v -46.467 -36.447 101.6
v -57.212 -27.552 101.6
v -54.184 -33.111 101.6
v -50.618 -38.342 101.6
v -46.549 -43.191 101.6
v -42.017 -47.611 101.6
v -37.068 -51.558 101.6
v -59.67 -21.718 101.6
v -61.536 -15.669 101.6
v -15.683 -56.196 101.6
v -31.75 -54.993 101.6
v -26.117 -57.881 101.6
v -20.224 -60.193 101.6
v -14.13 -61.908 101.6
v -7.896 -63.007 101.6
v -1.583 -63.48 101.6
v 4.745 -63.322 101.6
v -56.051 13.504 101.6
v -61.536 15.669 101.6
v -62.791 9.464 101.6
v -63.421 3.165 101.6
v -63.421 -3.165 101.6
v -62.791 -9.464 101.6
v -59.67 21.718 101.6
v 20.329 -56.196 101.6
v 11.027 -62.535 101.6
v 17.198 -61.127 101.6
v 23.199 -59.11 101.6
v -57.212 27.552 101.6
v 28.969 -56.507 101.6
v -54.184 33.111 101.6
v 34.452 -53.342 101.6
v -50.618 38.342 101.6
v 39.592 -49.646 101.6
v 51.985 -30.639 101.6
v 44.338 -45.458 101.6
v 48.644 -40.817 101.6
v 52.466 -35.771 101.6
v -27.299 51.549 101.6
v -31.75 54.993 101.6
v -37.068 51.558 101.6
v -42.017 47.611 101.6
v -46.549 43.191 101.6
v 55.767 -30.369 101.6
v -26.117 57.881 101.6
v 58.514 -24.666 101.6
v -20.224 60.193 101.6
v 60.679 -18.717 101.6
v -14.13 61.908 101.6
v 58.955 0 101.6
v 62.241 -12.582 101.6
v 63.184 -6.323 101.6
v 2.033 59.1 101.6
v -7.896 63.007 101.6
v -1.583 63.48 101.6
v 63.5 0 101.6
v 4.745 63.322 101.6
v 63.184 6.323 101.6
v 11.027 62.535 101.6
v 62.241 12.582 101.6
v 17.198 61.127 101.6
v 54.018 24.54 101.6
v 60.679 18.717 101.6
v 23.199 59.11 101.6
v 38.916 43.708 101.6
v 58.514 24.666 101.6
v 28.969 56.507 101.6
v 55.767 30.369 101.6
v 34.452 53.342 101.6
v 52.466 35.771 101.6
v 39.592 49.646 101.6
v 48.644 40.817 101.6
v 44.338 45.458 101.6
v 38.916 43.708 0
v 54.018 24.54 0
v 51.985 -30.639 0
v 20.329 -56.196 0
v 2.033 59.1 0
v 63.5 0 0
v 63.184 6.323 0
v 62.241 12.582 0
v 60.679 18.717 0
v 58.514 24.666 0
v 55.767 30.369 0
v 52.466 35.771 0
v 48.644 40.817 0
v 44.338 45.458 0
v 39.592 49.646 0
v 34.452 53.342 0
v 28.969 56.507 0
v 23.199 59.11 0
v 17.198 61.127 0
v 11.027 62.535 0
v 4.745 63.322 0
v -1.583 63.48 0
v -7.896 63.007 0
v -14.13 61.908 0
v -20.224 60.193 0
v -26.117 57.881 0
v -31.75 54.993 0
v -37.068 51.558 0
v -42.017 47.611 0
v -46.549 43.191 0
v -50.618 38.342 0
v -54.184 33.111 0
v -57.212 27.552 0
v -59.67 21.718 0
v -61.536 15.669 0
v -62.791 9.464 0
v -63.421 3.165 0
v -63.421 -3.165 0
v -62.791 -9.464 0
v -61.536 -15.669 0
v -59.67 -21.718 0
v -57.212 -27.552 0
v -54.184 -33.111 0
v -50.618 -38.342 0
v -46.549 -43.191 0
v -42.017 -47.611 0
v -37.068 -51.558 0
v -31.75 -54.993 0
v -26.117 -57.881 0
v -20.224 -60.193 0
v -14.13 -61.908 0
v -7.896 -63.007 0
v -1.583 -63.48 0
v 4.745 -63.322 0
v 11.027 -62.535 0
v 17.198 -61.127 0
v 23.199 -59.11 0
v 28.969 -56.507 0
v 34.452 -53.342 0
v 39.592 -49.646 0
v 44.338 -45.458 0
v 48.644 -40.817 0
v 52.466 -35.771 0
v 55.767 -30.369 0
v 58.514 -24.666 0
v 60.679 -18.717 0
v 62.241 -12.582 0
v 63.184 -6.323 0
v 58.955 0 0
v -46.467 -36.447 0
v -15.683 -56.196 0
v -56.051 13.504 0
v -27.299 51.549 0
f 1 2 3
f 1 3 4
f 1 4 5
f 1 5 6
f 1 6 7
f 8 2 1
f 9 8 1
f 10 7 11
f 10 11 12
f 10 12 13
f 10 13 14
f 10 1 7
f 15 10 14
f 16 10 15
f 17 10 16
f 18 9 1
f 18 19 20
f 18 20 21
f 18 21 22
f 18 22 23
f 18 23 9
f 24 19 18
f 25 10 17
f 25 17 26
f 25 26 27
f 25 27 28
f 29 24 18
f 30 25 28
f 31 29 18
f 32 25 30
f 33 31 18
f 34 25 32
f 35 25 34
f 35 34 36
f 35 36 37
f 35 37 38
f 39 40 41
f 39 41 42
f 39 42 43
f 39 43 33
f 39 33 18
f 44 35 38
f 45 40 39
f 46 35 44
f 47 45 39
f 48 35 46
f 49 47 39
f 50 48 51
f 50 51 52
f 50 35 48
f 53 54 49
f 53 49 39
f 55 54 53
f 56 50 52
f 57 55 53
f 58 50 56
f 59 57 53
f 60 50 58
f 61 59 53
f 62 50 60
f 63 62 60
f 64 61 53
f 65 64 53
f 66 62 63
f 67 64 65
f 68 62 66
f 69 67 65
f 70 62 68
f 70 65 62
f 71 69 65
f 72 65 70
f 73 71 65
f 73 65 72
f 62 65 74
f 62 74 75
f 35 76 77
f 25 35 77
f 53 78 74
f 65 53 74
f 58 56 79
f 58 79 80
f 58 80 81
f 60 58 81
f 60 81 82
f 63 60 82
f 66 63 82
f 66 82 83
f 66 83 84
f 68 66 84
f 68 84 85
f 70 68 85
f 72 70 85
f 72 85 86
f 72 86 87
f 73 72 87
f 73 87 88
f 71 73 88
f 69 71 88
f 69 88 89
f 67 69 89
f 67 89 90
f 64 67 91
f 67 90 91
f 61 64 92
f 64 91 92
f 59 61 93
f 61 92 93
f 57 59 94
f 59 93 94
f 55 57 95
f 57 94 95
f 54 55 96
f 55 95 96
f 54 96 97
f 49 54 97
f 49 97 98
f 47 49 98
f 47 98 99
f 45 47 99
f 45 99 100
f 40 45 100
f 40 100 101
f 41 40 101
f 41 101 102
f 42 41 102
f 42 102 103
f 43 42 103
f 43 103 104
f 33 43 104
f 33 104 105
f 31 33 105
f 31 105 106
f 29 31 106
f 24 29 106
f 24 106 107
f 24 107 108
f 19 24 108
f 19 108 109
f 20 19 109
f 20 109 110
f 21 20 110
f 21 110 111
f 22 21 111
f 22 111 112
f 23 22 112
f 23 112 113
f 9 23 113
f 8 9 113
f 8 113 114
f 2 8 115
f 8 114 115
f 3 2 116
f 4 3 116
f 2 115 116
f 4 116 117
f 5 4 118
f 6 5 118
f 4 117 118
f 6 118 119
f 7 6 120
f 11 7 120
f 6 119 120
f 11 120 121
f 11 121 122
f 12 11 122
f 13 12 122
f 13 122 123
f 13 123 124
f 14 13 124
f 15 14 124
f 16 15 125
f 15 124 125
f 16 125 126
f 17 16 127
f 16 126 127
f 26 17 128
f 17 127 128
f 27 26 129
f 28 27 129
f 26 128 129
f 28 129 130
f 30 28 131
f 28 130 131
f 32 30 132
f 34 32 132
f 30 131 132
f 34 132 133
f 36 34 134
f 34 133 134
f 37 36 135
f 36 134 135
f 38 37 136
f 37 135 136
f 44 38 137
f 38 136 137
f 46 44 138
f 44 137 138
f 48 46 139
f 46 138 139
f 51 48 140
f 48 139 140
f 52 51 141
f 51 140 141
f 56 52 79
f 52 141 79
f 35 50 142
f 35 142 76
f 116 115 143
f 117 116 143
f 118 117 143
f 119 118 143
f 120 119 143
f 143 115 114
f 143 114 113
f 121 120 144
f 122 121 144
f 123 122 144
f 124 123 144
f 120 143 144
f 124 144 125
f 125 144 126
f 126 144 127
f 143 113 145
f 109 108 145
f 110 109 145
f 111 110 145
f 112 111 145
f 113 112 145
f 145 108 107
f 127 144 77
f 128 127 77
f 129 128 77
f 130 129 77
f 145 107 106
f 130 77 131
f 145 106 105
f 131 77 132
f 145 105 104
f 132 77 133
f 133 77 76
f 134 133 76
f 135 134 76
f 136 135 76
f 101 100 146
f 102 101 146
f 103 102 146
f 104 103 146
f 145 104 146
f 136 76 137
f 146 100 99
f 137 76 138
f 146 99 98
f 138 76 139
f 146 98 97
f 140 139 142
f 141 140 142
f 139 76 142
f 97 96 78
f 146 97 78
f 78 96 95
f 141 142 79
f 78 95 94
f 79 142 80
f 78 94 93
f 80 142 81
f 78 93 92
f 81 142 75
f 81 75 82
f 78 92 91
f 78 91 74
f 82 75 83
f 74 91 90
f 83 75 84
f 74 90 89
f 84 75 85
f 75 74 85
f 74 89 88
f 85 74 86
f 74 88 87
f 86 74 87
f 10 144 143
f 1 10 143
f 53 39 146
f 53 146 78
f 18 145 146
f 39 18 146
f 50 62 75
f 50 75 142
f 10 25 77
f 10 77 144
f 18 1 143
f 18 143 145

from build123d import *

# Parameters (mm, degrees)
F0_R     = 63.5
F1_DEPTH = 101.6
F2_DEPTH = 101.6
F3_DEPTH = 25.4
F4_DEPTH = 101.6


with BuildPart() as f1:
    # F0 (on Top) → F1 (new body)
    with BuildSketch(Plane.XY):
        Circle(F0_R)
        Polygon((-15.682541, -56.195769), (-46.46679, -36.447387), (-56.050561, 13.50441), (-27.299238, 51.549092), (2.032924, 59.099946), (38.915936, 43.707822), (54.017641, 24.540273), (58.954742, 0), (51.984716, -30.639039), (20.32922, -56.195769), align=None, mode=Mode.SUBTRACT)
    extrude(amount=F1_DEPTH)

    # F0 (on Top) → F2 (join)
    with BuildSketch(Plane.XY):
        Circle(F0_R)
        Polygon((-15.682541, -56.195769), (-46.46679, -36.447387), (-56.050561, 13.50441), (-27.299238, 51.549092), (2.032924, 59.099946), (38.915936, 43.707822), (54.017641, 24.540273), (58.954742, 0), (51.984716, -30.639039), (20.32922, -56.195769), align=None, mode=Mode.SUBTRACT)
    extrude(amount=F2_DEPTH)

    # F0 (on Top) → F3 (join)
    with BuildSketch(Plane.XY):
        Circle(F0_R)
        Polygon((-15.682541, -56.195769), (-46.46679, -36.447387), (-56.050561, 13.50441), (-27.299238, 51.549092), (2.032924, 59.099946), (38.915936, 43.707822), (54.017641, 24.540273), (58.954742, 0), (51.984716, -30.639039), (20.32922, -56.195769), align=None, mode=Mode.SUBTRACT)
    extrude(amount=F3_DEPTH)

    # F0 (on Top) → F4 (join)
    with BuildSketch(Plane.XY):
        Circle(F0_R)
        Polygon((-15.682541, -56.195769), (-46.46679, -36.447387), (-56.050561, 13.50441), (-27.299238, 51.549092), (2.032924, 59.099946), (38.915936, 43.707822), (54.017641, 24.540273), (58.954742, 0), (51.984716, -30.639039), (20.32922, -56.195769), align=None, mode=Mode.SUBTRACT)
    extrude(amount=F4_DEPTH)


solid = f1.part
